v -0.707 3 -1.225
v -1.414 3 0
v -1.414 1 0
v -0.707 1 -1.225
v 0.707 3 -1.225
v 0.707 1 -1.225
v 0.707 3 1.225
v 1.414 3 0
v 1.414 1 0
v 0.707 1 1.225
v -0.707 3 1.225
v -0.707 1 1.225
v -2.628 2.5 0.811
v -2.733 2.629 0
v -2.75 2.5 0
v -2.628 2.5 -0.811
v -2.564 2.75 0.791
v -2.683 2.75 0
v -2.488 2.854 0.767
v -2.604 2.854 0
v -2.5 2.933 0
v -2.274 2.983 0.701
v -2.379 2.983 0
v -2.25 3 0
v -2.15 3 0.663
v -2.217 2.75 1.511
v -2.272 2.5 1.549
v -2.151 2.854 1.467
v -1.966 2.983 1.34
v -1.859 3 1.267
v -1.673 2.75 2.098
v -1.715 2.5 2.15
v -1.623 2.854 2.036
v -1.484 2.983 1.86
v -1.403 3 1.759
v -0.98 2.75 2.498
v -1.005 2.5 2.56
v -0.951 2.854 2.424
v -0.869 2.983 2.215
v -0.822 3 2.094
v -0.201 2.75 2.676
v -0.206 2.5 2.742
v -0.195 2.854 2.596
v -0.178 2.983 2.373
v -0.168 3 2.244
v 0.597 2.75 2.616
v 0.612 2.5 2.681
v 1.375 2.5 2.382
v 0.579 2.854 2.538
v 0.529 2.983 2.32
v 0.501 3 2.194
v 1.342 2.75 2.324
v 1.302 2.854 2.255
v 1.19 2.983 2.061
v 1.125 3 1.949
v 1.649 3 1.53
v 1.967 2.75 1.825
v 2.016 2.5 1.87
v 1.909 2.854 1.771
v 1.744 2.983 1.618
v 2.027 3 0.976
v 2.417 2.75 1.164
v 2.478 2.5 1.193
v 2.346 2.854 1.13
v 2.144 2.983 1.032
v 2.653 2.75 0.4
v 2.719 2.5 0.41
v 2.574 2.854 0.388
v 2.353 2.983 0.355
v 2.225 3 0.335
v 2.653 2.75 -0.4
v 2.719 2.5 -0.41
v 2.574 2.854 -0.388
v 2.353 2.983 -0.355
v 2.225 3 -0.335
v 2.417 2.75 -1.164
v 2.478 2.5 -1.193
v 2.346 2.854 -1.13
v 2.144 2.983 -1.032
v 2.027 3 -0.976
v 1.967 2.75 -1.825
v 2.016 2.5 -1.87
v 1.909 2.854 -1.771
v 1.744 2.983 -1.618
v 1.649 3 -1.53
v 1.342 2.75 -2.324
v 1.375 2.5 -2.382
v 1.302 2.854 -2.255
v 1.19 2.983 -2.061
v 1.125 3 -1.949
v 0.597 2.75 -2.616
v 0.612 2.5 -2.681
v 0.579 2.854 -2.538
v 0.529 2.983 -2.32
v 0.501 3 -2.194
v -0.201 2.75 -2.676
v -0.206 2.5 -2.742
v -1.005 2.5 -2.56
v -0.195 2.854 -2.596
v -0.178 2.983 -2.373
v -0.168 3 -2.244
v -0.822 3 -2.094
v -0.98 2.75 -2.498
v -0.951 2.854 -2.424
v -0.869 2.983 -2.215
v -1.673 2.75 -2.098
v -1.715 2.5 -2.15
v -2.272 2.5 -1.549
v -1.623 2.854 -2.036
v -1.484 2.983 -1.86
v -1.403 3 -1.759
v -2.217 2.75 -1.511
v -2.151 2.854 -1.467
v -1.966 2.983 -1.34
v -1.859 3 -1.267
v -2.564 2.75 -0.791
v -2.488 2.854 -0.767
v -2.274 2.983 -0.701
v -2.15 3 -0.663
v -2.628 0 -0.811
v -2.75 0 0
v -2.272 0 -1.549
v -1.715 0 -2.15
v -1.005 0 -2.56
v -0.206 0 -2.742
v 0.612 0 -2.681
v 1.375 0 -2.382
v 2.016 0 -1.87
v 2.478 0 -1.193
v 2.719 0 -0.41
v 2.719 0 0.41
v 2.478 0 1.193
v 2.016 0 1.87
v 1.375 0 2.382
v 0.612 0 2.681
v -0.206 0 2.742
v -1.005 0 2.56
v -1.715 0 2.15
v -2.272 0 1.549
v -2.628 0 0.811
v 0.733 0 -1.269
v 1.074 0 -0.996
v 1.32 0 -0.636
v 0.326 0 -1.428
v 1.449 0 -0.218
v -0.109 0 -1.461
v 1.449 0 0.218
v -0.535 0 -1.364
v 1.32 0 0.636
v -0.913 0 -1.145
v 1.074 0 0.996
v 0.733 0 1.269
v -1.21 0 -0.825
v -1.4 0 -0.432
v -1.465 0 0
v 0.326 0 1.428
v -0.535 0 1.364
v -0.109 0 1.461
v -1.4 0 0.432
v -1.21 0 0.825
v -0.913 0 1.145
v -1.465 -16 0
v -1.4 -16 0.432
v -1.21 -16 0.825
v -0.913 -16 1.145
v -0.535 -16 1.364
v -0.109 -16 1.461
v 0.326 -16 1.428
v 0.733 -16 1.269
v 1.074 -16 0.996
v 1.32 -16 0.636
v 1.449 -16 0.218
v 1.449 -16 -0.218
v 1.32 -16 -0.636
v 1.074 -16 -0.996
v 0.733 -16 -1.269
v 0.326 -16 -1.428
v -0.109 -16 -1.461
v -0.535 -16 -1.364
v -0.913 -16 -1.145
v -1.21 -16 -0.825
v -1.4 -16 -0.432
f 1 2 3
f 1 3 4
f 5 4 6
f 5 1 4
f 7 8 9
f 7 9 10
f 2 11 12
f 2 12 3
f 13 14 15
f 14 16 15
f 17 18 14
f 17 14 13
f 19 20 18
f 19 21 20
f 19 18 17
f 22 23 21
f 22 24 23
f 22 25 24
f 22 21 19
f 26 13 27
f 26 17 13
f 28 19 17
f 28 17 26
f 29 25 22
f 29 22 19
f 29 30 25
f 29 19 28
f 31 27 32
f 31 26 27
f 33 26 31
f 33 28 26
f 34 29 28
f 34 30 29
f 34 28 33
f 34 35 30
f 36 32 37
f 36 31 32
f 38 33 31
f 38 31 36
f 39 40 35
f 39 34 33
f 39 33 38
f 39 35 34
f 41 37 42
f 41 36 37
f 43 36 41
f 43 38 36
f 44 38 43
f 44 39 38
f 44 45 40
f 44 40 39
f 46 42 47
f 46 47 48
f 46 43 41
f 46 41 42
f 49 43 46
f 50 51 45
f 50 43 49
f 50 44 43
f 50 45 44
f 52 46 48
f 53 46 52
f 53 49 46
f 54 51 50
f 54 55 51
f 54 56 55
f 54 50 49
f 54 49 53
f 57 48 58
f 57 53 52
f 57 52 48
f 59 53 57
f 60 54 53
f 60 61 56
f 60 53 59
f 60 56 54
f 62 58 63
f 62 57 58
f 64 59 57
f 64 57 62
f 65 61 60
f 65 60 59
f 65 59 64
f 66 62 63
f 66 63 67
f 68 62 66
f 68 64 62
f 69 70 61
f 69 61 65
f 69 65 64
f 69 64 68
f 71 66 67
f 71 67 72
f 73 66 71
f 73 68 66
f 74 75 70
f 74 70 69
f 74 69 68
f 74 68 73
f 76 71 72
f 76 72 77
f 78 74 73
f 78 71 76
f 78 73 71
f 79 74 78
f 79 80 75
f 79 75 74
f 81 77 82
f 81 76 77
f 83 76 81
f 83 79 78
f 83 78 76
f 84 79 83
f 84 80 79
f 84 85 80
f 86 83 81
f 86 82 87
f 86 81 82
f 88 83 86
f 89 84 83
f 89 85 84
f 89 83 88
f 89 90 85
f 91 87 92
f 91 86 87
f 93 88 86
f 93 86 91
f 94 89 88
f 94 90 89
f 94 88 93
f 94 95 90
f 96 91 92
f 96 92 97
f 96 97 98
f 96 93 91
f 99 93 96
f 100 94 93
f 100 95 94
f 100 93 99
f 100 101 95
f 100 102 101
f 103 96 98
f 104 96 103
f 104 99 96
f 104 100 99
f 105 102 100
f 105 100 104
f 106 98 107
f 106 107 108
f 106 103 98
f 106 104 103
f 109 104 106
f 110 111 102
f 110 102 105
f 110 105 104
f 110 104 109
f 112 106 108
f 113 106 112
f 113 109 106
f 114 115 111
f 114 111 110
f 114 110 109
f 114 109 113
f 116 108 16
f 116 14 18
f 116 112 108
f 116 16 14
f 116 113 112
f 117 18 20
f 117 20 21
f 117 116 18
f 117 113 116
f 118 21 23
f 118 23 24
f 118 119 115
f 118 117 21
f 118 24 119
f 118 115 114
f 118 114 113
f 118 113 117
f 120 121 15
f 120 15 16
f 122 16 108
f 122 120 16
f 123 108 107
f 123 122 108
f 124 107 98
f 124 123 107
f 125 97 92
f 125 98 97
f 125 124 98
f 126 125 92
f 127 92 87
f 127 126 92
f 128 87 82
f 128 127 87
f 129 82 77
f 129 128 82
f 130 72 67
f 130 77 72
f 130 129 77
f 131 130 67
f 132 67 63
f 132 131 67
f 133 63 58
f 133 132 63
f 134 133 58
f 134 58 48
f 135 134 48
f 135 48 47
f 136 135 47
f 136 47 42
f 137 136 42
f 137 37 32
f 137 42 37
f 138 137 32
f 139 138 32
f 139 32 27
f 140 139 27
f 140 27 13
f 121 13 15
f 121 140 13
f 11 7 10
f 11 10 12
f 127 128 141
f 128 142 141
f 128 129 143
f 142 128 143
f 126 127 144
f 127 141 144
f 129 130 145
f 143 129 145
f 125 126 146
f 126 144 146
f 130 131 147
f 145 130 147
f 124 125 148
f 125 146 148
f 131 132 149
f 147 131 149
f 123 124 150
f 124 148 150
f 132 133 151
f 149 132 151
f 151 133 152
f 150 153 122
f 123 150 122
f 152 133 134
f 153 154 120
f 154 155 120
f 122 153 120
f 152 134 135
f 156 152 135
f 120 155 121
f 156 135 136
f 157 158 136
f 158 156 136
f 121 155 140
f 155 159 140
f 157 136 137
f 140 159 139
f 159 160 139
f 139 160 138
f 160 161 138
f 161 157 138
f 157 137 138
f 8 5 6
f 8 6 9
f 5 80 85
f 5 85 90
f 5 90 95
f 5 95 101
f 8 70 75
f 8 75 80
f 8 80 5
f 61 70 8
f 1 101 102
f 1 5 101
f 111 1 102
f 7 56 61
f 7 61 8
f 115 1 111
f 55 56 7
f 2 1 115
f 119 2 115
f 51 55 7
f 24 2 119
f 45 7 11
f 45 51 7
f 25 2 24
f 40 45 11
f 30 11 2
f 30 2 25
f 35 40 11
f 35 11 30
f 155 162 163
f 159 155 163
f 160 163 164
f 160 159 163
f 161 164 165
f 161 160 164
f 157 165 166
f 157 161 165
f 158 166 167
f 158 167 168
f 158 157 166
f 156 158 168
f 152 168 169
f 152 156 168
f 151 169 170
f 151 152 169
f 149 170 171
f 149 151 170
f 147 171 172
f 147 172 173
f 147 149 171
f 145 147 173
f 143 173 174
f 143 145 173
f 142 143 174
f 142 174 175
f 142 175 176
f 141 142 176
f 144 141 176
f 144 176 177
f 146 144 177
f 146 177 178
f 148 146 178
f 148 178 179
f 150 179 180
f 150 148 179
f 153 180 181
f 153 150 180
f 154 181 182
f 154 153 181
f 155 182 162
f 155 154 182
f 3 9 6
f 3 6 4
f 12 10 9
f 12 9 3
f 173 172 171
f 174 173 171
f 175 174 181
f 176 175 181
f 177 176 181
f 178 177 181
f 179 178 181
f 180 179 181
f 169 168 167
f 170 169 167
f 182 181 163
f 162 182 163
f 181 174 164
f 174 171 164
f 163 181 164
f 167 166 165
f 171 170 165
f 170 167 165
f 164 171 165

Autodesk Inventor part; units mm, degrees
ref_plane "YZ Plane" through (0, 0, 0) normal (1, 0, 0) x (0, 1, 0)
ref_plane "XZ Plane" through (0, 0, 0) normal (0, 1, 0) x (-1, 0, 0)
ref_plane "XY Plane" through (0, 0, 0) normal (0, 0, 1) x (1, 0, 0)
sketch "Sketch1" plane through (0, 0, 0) normal (0, 1, 0) x (-1, 0, 0)
  circle A0 centre (0, 0) radius 1.465
  circle A1 centre (0, 0) radius 2.75
  line L0 (0.7073, -1.225) -> (-0.7073, -1.225)
  line L1 (-0.7073, -1.225) -> (-1.4145, 0)
  line L2 (-1.4145, 0) -> (-0.7073, 1.225)
  line L3 (-0.7073, 1.225) -> (0.7073, 1.225)
  line L4 (0.7073, 1.225) -> (1.4145, 0)
  line L5 (1.4145, 0) -> (0.7073, -1.225)
  dimension "d0" = 2.93
  dimension "d1" = 5.5
  dimension "d8" = 2.45
extrude "Extrusion1" add sketch "Sketch1" along normal blind 3 contours A0 | A1 | L0 L1 L2 L3 L4 L5
extrude "Extrusion2" add sketch "Sketch1" against normal blind 16 contours A0 | L0 L1 L2 L3 L4 L5
extrude "Extrusion3" cut sketch "Sketch1" against normal blind 2 from surface at 3 contours L0 L1 L2 L3 L4 L5
fillet "Fillet1" radius 0.5 1 edges at (2.75, 3, 0)
thread "Thread2" size "M3x0.5" class "6g" standard "ANSI Metric M Profile" full length
equation "\"d4\" = length"
equation "\"length\" = 16"
properties part number "M3x16"
